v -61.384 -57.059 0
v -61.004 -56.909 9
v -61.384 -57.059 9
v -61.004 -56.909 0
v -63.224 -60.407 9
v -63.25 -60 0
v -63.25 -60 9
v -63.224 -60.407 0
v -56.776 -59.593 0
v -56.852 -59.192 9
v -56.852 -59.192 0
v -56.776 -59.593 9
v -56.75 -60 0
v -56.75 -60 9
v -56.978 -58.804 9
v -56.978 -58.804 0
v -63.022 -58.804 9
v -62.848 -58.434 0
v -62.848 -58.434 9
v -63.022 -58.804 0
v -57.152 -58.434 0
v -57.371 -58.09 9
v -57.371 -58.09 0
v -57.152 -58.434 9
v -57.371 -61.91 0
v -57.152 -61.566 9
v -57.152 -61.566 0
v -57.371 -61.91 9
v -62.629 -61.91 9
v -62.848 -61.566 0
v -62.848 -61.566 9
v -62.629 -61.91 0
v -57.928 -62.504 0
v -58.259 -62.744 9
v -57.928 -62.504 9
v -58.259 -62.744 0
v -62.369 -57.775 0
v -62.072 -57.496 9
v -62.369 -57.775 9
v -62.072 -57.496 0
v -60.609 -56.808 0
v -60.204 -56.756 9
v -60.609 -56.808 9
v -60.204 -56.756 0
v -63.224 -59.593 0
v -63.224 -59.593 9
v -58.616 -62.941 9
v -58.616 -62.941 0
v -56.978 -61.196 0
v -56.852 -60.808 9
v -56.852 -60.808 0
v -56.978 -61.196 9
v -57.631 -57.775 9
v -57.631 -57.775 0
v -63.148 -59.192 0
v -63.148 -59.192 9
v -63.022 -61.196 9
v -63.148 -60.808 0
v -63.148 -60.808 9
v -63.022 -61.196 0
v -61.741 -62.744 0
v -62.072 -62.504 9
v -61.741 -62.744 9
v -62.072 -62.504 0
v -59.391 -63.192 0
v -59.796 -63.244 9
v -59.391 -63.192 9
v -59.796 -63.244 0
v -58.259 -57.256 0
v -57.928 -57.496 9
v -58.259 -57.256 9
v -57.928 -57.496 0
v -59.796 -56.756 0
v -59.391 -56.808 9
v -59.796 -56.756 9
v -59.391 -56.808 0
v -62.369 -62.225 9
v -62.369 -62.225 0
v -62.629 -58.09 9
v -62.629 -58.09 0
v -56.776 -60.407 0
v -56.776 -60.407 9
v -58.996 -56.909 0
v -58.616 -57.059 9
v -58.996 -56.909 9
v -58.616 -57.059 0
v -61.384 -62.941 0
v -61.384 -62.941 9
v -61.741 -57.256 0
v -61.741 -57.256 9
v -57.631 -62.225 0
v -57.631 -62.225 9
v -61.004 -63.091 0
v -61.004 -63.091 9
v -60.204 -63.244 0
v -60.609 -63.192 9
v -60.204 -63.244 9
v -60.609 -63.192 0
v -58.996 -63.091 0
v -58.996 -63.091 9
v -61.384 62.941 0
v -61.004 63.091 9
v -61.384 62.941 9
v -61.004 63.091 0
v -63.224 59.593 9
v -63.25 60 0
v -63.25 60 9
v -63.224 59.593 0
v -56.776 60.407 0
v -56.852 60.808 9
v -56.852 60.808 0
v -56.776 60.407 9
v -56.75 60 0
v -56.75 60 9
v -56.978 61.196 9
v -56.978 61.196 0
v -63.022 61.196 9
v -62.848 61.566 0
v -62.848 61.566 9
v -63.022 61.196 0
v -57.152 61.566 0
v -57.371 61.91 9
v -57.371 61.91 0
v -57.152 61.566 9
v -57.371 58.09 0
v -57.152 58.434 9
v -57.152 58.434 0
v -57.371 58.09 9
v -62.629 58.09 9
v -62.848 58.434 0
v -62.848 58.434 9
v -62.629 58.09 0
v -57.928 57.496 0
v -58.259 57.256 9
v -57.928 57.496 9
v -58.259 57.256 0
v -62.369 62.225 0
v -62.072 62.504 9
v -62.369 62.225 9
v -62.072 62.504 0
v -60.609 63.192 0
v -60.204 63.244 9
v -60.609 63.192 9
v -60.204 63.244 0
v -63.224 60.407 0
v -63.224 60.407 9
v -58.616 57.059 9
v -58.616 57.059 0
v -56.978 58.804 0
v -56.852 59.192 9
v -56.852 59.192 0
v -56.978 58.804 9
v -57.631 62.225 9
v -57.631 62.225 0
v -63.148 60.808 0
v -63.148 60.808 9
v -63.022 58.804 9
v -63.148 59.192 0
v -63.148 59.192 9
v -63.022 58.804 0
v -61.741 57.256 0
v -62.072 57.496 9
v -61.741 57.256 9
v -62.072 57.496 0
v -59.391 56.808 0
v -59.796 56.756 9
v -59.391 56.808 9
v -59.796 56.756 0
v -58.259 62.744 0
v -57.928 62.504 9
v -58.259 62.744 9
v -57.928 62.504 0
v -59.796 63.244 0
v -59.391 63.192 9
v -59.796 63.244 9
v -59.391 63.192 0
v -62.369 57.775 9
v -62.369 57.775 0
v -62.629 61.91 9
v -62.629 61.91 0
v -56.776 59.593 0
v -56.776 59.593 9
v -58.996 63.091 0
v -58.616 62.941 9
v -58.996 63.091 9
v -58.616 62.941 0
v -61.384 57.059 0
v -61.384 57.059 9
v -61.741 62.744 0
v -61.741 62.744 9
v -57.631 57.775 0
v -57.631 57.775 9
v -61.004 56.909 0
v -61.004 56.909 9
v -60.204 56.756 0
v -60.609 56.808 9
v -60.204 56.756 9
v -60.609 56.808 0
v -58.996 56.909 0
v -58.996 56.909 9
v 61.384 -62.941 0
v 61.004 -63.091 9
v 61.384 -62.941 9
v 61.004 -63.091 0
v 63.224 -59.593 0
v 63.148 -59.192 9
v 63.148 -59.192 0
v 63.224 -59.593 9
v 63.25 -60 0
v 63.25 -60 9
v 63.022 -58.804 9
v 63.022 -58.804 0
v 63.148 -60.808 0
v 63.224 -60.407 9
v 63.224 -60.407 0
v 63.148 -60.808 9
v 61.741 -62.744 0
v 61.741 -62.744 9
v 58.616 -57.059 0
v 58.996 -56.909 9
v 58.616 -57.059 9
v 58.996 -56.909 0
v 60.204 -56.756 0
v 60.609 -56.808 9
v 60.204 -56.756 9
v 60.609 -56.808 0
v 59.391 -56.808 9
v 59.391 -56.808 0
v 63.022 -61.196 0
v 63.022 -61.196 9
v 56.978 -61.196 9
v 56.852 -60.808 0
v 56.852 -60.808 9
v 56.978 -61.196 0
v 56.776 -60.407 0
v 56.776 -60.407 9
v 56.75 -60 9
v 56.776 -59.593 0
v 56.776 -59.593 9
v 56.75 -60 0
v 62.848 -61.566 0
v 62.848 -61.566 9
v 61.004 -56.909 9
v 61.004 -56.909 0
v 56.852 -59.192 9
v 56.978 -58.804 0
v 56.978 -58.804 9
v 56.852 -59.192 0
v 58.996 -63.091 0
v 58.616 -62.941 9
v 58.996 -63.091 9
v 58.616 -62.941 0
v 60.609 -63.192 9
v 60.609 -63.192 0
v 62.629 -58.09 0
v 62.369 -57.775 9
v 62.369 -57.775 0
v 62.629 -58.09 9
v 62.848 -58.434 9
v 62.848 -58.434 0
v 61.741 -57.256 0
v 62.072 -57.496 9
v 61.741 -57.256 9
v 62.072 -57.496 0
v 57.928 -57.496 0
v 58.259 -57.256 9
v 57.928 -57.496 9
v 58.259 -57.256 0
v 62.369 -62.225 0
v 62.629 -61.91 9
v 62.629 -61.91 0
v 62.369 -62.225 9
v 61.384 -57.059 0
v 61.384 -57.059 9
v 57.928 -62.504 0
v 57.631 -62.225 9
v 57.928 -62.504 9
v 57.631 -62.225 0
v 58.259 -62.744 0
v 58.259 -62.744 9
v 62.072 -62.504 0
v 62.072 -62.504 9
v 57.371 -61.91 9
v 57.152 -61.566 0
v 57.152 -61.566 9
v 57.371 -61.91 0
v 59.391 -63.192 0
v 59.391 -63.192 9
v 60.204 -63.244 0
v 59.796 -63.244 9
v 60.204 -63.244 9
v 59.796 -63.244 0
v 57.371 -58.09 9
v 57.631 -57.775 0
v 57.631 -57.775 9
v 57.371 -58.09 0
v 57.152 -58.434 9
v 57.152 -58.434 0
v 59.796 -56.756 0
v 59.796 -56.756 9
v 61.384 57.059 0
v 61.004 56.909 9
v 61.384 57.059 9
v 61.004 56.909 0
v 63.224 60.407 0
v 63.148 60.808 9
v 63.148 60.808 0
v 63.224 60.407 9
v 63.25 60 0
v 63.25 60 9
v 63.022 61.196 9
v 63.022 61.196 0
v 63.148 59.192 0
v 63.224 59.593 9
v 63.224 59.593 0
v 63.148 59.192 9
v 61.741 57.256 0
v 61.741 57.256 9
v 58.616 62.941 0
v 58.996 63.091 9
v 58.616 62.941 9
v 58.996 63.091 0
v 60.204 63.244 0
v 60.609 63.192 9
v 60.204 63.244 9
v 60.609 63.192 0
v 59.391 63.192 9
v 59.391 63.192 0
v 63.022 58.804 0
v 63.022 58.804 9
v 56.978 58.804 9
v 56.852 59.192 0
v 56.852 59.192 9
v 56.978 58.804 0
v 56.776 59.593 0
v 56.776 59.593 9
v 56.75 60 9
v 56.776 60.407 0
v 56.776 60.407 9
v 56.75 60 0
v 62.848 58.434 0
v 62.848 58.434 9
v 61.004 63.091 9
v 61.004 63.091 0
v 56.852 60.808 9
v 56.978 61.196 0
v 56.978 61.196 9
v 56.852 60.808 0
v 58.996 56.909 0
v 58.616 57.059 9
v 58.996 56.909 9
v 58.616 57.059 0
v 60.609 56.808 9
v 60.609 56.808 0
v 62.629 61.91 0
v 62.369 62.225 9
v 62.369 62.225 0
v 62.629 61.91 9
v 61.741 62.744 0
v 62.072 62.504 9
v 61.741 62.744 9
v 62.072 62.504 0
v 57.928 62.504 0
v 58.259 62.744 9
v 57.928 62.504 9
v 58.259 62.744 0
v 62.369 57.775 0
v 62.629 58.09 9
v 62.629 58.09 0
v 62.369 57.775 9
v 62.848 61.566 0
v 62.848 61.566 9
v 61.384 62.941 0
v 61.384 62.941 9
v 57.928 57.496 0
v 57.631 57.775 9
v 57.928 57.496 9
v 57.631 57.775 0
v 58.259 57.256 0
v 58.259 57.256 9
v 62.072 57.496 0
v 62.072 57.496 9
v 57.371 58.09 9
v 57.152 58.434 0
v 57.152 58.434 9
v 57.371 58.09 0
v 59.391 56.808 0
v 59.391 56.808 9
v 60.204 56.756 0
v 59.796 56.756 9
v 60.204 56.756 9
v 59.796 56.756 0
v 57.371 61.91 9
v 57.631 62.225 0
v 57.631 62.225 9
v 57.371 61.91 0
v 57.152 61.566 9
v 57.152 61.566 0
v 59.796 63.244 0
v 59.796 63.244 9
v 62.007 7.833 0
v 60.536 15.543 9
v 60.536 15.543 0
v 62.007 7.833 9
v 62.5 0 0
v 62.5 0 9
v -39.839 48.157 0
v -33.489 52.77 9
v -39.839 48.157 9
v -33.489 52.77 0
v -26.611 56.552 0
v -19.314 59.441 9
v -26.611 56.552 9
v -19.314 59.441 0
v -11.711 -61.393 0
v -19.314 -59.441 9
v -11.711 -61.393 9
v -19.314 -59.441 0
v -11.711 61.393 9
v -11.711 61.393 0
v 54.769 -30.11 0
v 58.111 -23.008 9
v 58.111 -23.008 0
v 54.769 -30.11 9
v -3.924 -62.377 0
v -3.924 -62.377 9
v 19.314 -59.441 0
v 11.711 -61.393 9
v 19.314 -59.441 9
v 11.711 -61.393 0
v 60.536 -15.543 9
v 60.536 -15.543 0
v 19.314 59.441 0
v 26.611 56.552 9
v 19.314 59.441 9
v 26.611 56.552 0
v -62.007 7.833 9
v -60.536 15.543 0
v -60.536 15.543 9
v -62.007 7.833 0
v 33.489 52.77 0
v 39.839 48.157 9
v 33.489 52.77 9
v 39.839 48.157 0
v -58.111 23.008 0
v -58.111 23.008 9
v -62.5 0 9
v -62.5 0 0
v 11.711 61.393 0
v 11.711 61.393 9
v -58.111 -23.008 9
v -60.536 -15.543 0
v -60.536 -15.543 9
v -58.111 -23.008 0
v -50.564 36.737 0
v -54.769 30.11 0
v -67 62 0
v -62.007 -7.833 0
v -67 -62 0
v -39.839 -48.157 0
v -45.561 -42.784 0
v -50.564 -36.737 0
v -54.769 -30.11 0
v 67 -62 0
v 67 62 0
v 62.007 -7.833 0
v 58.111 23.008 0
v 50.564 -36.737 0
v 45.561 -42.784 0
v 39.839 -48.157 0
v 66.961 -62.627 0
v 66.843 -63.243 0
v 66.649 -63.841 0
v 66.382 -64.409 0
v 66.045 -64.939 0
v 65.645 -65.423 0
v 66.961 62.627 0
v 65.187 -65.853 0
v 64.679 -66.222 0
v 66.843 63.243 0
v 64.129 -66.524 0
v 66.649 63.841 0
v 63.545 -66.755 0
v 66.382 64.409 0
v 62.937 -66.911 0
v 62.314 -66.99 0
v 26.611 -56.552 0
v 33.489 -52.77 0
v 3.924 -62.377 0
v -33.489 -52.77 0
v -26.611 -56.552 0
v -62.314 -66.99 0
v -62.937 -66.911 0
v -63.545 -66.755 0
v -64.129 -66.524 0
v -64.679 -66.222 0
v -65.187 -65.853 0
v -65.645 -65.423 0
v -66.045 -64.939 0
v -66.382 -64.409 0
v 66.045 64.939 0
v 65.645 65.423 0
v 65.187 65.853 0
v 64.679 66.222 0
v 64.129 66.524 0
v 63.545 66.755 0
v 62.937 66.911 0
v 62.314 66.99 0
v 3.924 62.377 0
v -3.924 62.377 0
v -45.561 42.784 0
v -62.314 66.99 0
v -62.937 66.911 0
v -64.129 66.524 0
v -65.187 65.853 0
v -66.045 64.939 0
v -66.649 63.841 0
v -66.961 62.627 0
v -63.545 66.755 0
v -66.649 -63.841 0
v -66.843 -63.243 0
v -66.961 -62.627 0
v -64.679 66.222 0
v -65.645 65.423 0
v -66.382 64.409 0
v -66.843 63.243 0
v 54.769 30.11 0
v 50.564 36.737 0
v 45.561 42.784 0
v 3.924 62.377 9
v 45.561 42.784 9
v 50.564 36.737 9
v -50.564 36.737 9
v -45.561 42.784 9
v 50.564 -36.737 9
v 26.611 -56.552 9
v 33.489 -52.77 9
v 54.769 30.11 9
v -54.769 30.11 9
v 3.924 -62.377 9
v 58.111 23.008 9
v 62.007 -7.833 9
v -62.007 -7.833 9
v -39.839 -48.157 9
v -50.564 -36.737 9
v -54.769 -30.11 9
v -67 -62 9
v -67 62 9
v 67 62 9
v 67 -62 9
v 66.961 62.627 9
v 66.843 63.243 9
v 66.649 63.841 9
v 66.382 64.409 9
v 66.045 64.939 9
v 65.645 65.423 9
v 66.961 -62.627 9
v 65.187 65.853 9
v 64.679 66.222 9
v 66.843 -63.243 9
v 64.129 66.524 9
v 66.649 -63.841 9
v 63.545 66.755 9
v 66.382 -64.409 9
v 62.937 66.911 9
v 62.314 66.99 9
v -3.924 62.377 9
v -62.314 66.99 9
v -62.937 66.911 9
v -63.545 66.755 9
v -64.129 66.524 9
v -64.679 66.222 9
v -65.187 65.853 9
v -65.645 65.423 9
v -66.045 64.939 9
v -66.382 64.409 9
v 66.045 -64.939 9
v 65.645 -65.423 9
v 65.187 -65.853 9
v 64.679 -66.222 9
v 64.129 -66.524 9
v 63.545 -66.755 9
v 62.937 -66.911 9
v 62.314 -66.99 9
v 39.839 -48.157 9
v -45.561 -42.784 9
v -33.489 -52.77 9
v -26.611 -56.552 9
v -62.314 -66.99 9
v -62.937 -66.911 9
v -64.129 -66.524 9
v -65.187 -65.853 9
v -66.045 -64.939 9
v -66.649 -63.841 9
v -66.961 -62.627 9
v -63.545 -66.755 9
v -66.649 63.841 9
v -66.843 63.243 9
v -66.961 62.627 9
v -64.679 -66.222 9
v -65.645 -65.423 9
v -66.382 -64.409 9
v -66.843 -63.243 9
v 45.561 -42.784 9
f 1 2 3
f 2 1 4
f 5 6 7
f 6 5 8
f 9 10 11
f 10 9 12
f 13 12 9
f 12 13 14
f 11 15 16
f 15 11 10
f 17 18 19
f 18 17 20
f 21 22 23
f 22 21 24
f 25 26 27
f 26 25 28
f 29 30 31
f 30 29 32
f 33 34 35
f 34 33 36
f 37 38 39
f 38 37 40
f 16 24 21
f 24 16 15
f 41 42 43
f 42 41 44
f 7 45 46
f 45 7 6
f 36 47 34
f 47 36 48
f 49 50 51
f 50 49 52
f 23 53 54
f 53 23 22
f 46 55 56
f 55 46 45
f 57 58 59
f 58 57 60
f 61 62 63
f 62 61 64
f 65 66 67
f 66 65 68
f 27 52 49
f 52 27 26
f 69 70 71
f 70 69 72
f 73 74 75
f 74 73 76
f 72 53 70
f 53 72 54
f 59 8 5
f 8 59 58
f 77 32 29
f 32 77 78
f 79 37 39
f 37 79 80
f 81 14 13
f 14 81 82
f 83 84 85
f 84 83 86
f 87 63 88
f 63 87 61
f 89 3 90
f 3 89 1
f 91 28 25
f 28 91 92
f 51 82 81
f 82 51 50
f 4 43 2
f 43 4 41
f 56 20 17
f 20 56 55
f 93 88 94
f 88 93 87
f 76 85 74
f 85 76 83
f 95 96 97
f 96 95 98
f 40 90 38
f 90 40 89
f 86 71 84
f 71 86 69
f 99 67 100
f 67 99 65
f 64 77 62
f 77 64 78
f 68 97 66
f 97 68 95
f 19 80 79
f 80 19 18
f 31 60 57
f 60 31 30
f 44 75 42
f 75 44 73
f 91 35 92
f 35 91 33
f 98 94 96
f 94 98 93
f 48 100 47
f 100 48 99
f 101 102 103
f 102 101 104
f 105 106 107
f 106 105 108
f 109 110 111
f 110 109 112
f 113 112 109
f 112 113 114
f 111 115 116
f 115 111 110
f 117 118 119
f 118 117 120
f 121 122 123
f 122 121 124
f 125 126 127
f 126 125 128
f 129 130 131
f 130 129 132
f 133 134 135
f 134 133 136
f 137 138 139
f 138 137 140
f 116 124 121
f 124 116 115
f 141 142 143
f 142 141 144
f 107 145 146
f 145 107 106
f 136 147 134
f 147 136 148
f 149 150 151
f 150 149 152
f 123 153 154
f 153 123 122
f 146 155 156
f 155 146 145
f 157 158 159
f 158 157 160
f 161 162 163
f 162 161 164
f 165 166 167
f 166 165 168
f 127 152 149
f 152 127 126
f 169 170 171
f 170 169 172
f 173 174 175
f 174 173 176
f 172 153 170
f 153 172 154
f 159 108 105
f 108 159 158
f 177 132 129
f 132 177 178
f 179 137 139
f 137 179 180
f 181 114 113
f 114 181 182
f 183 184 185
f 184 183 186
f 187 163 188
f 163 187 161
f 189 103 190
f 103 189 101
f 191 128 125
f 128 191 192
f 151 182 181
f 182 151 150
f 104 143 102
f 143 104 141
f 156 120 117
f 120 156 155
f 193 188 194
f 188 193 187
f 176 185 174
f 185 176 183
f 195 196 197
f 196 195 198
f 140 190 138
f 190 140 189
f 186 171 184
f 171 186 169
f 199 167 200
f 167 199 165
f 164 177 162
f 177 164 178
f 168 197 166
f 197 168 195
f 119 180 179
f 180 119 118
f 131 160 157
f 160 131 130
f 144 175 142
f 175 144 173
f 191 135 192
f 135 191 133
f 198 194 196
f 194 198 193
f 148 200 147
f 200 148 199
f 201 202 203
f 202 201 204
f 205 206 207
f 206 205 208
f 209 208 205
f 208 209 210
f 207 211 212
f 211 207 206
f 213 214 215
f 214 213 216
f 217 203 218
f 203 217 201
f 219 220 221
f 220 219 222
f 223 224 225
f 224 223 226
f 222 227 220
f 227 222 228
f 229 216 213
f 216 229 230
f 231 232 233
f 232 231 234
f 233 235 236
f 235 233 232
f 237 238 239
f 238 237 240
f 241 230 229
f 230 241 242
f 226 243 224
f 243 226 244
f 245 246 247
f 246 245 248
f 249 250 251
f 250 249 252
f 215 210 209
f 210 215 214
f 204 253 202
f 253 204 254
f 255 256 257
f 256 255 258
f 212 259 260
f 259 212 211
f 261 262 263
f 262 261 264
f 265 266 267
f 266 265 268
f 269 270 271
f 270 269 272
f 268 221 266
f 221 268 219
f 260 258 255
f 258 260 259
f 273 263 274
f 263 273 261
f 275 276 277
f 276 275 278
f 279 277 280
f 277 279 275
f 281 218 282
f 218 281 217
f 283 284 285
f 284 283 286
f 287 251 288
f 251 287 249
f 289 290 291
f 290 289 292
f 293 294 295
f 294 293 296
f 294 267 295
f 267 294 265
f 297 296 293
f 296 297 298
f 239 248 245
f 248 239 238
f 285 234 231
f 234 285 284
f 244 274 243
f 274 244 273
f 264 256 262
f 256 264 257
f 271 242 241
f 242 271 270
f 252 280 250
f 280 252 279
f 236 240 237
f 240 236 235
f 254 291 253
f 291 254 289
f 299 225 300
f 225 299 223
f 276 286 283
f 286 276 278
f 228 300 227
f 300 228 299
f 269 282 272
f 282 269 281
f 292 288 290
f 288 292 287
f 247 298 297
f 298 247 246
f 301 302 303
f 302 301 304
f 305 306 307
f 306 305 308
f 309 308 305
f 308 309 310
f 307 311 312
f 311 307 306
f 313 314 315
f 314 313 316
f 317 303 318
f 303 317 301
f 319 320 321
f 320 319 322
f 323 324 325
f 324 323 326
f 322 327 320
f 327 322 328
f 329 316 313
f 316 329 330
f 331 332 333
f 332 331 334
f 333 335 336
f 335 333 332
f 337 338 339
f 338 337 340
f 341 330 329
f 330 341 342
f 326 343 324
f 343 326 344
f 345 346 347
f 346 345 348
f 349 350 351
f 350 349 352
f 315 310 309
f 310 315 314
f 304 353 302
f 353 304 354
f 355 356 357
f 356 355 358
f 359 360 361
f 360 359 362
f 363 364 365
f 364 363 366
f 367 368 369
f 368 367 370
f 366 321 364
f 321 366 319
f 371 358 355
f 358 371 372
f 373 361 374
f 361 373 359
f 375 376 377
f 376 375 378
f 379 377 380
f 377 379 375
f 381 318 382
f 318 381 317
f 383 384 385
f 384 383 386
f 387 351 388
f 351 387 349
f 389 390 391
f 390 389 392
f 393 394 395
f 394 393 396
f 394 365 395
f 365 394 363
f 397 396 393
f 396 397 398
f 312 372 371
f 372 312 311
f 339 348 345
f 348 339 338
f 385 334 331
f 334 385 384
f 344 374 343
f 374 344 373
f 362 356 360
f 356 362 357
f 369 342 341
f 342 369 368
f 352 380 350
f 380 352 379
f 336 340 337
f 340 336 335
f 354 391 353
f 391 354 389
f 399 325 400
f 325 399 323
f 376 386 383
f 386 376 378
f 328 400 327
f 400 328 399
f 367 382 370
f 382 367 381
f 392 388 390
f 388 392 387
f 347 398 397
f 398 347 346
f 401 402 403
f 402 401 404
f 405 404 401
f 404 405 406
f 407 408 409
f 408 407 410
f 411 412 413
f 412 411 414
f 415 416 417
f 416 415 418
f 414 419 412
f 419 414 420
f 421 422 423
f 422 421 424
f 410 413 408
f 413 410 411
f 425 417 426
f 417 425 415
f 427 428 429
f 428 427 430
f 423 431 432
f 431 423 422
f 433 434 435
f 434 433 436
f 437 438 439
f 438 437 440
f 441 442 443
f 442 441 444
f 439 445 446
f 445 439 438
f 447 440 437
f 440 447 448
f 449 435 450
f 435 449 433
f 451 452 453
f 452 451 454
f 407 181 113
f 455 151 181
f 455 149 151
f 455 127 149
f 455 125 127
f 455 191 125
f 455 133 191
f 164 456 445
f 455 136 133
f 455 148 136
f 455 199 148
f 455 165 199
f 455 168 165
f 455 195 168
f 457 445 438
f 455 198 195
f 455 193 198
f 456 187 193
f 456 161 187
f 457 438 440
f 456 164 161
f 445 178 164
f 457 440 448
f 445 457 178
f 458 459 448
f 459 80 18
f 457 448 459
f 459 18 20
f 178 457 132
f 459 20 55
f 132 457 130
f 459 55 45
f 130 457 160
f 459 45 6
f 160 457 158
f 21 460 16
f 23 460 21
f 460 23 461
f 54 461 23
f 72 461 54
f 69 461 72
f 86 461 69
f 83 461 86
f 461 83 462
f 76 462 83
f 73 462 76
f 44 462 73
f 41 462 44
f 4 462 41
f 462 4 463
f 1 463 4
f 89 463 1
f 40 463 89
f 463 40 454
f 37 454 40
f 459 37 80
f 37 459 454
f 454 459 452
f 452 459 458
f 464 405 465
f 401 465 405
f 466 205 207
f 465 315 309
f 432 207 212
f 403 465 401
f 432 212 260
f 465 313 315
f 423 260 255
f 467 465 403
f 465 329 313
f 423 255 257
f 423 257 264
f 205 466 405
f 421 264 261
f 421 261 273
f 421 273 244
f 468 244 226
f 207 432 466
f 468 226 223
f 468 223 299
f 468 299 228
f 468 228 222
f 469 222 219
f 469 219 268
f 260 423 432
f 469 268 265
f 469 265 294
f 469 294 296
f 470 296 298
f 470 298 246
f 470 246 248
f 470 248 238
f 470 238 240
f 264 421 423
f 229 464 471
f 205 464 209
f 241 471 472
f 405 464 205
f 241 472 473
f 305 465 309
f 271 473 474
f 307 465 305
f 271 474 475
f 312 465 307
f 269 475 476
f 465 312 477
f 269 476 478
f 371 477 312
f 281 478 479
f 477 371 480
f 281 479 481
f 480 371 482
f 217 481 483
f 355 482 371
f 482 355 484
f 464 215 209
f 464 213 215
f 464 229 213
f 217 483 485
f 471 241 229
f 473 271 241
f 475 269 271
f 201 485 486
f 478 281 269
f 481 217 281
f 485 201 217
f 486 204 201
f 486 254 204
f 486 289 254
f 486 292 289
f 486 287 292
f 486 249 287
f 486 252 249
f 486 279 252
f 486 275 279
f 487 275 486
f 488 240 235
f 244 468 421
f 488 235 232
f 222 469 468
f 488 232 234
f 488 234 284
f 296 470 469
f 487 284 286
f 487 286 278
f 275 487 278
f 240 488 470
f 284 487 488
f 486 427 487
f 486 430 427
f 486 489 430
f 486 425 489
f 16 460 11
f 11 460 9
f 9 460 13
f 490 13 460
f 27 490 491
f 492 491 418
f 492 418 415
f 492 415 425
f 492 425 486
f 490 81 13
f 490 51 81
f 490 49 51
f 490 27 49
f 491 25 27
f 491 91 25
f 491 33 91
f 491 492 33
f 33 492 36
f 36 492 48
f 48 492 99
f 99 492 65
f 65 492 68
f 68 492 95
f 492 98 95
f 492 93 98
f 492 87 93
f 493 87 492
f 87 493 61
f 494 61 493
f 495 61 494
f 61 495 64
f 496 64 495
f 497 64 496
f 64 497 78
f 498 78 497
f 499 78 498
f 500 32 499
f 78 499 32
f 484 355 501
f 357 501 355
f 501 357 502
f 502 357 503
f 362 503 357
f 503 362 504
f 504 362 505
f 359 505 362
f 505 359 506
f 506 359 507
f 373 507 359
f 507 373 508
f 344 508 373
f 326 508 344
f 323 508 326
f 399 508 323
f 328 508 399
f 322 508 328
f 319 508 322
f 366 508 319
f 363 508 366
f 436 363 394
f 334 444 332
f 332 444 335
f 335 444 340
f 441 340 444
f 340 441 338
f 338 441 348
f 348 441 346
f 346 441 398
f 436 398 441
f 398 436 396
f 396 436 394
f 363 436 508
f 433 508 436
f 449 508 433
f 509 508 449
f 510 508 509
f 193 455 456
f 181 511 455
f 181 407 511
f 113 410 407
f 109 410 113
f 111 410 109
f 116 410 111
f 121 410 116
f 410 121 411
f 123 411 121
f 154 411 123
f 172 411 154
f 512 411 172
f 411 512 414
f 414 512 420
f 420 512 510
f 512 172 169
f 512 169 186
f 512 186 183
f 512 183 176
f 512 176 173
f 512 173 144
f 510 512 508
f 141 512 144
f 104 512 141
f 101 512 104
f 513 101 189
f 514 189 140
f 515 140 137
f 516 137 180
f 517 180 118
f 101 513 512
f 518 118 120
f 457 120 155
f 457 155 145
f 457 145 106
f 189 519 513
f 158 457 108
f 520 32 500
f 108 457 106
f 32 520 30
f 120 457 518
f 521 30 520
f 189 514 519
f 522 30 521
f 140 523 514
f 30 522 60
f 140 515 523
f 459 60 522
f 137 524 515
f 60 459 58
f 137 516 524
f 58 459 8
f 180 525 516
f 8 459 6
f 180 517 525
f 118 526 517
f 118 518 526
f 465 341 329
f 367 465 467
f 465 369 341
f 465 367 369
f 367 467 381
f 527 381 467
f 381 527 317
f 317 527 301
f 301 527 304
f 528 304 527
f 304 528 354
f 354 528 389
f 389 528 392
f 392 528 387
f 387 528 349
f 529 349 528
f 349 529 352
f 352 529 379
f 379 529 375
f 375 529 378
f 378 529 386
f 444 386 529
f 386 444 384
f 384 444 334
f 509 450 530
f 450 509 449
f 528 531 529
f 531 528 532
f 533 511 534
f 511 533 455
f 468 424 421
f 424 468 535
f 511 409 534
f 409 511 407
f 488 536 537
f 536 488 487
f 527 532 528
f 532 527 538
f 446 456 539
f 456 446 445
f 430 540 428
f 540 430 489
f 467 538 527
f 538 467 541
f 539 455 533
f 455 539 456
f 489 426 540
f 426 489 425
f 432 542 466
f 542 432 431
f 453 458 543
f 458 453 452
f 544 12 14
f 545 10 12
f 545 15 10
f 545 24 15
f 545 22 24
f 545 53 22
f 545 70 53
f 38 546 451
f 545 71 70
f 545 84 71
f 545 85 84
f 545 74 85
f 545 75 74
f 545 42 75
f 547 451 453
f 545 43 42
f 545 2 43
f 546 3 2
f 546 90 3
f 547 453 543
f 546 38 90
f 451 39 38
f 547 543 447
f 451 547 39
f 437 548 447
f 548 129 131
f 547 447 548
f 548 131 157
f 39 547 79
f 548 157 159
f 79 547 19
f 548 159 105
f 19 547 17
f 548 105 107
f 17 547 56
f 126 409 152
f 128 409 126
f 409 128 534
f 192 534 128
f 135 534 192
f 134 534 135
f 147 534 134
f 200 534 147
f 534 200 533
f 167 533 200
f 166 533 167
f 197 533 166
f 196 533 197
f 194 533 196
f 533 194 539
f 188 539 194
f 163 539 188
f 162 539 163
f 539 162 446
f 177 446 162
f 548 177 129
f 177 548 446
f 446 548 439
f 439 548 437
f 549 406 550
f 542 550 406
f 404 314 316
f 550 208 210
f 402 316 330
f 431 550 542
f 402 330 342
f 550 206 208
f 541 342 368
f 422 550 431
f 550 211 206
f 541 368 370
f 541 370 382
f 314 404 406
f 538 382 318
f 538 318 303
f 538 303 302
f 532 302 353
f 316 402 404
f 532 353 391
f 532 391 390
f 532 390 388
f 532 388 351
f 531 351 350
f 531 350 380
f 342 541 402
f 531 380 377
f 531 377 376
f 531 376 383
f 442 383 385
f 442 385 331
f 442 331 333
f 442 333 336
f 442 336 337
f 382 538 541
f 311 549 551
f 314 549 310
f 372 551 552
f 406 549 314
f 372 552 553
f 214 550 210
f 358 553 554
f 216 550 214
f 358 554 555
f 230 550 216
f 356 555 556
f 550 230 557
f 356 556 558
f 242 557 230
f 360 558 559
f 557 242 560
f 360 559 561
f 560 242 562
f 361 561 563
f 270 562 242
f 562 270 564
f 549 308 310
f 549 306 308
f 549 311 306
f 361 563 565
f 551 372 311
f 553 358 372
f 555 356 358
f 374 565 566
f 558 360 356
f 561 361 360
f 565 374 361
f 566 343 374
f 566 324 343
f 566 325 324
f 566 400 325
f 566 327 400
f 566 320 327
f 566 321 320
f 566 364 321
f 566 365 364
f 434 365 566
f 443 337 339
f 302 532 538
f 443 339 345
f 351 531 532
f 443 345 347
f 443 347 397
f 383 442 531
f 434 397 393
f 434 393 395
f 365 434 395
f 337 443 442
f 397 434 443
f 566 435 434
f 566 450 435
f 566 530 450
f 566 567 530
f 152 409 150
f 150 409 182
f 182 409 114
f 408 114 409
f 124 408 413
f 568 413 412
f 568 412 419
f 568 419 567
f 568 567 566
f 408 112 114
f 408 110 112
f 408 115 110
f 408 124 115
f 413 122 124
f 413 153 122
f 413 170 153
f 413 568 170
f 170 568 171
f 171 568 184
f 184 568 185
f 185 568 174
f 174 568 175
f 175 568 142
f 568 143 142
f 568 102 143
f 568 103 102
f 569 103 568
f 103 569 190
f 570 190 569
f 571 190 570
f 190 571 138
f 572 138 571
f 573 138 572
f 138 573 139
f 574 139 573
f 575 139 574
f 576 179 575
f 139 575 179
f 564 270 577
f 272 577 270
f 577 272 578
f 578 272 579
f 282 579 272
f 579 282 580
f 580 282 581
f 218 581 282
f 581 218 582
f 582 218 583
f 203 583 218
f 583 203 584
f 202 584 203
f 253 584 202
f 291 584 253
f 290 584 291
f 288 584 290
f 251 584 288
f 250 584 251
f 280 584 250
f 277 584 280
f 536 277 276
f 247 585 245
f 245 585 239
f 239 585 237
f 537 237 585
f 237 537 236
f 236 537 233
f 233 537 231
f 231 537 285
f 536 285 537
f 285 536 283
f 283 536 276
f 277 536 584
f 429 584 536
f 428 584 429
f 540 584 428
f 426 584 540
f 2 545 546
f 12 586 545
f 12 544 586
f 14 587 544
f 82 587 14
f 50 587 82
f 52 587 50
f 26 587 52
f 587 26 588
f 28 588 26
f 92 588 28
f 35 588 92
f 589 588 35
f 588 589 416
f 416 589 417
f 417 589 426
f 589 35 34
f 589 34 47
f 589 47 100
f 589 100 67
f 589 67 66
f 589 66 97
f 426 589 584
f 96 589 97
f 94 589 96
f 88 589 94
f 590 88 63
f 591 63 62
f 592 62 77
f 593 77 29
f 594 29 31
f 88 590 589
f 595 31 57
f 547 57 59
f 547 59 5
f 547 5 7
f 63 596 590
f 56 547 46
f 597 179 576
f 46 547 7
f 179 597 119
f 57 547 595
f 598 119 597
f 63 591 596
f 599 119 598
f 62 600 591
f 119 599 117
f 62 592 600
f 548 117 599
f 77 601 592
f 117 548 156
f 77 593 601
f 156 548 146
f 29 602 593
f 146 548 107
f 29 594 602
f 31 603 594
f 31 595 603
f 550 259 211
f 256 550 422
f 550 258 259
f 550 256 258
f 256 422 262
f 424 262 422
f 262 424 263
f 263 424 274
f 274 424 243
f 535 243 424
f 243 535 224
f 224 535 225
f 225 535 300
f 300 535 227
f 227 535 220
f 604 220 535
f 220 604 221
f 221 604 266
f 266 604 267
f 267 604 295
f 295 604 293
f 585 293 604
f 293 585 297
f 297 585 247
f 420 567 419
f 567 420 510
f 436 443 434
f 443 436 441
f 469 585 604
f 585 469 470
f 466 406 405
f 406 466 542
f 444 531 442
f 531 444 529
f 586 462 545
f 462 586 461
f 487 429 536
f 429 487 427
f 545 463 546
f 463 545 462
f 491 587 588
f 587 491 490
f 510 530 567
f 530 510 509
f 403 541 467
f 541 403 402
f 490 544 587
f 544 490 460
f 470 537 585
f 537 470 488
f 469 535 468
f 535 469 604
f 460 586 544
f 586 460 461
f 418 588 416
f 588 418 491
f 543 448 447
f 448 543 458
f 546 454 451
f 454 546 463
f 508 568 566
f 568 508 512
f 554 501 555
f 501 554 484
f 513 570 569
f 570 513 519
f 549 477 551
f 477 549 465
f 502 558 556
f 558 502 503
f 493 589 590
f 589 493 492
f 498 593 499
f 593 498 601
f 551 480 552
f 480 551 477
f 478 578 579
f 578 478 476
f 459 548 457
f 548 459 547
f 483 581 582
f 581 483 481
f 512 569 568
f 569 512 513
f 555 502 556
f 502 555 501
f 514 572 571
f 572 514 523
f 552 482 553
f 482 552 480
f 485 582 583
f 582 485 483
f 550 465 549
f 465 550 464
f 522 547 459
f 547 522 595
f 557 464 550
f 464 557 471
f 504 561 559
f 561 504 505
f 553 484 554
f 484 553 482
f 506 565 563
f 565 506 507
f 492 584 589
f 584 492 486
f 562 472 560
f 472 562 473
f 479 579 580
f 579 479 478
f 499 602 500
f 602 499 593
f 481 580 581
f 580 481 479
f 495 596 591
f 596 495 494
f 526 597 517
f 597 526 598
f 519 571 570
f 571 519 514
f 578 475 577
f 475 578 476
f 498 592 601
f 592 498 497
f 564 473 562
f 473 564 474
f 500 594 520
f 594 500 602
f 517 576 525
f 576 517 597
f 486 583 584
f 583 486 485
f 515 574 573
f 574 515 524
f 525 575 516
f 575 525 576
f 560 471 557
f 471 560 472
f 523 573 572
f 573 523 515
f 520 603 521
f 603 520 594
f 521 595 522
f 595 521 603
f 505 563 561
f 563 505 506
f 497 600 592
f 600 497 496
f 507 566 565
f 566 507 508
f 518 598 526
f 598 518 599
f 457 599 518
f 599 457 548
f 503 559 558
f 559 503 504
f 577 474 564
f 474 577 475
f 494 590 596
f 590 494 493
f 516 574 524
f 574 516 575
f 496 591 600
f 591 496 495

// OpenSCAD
$fn = 50;

difference() {
	union() {
		hull() {
			translate(v = [-62.0, 62.0, 0]) {
				cylinder(h = 9, r = 5);
			}
			translate(v = [62.0, 62.0, 0]) {
				cylinder(h = 9, r = 5);
			}
			translate(v = [-62.0, -62.0, 0]) {
				cylinder(h = 9, r = 5);
			}
			translate(v = [62.0, -62.0, 0]) {
				cylinder(h = 9, r = 5);
			}
		}
	}
	union() {
		translate(v = [-60.0, -60.0, -100.0]) {
			cylinder(h = 200, r = 3.25);
		}
		translate(v = [-60.0, 60.0, -100.0]) {
			cylinder(h = 200, r = 3.25);
		}
		translate(v = [60.0, -60.0, -100.0]) {
			cylinder(h = 200, r = 3.25);
		}
		translate(v = [60.0, 60.0, -100.0]) {
			cylinder(h = 200, r = 3.25);
		}
		translate(v = [-60.0, -60.0, -100.0]) {
			cylinder(h = 200, r = 1.8);
		}
		translate(v = [-60.0, 60.0, -100.0]) {
			cylinder(h = 200, r = 1.8);
		}
		translate(v = [60.0, -60.0, -100.0]) {
			cylinder(h = 200, r = 1.8);
		}
		translate(v = [60.0, 60.0, -100.0]) {
			cylinder(h = 200, r = 1.8);
		}
		cylinder(h = 9, r = 62.5);
	}
}
